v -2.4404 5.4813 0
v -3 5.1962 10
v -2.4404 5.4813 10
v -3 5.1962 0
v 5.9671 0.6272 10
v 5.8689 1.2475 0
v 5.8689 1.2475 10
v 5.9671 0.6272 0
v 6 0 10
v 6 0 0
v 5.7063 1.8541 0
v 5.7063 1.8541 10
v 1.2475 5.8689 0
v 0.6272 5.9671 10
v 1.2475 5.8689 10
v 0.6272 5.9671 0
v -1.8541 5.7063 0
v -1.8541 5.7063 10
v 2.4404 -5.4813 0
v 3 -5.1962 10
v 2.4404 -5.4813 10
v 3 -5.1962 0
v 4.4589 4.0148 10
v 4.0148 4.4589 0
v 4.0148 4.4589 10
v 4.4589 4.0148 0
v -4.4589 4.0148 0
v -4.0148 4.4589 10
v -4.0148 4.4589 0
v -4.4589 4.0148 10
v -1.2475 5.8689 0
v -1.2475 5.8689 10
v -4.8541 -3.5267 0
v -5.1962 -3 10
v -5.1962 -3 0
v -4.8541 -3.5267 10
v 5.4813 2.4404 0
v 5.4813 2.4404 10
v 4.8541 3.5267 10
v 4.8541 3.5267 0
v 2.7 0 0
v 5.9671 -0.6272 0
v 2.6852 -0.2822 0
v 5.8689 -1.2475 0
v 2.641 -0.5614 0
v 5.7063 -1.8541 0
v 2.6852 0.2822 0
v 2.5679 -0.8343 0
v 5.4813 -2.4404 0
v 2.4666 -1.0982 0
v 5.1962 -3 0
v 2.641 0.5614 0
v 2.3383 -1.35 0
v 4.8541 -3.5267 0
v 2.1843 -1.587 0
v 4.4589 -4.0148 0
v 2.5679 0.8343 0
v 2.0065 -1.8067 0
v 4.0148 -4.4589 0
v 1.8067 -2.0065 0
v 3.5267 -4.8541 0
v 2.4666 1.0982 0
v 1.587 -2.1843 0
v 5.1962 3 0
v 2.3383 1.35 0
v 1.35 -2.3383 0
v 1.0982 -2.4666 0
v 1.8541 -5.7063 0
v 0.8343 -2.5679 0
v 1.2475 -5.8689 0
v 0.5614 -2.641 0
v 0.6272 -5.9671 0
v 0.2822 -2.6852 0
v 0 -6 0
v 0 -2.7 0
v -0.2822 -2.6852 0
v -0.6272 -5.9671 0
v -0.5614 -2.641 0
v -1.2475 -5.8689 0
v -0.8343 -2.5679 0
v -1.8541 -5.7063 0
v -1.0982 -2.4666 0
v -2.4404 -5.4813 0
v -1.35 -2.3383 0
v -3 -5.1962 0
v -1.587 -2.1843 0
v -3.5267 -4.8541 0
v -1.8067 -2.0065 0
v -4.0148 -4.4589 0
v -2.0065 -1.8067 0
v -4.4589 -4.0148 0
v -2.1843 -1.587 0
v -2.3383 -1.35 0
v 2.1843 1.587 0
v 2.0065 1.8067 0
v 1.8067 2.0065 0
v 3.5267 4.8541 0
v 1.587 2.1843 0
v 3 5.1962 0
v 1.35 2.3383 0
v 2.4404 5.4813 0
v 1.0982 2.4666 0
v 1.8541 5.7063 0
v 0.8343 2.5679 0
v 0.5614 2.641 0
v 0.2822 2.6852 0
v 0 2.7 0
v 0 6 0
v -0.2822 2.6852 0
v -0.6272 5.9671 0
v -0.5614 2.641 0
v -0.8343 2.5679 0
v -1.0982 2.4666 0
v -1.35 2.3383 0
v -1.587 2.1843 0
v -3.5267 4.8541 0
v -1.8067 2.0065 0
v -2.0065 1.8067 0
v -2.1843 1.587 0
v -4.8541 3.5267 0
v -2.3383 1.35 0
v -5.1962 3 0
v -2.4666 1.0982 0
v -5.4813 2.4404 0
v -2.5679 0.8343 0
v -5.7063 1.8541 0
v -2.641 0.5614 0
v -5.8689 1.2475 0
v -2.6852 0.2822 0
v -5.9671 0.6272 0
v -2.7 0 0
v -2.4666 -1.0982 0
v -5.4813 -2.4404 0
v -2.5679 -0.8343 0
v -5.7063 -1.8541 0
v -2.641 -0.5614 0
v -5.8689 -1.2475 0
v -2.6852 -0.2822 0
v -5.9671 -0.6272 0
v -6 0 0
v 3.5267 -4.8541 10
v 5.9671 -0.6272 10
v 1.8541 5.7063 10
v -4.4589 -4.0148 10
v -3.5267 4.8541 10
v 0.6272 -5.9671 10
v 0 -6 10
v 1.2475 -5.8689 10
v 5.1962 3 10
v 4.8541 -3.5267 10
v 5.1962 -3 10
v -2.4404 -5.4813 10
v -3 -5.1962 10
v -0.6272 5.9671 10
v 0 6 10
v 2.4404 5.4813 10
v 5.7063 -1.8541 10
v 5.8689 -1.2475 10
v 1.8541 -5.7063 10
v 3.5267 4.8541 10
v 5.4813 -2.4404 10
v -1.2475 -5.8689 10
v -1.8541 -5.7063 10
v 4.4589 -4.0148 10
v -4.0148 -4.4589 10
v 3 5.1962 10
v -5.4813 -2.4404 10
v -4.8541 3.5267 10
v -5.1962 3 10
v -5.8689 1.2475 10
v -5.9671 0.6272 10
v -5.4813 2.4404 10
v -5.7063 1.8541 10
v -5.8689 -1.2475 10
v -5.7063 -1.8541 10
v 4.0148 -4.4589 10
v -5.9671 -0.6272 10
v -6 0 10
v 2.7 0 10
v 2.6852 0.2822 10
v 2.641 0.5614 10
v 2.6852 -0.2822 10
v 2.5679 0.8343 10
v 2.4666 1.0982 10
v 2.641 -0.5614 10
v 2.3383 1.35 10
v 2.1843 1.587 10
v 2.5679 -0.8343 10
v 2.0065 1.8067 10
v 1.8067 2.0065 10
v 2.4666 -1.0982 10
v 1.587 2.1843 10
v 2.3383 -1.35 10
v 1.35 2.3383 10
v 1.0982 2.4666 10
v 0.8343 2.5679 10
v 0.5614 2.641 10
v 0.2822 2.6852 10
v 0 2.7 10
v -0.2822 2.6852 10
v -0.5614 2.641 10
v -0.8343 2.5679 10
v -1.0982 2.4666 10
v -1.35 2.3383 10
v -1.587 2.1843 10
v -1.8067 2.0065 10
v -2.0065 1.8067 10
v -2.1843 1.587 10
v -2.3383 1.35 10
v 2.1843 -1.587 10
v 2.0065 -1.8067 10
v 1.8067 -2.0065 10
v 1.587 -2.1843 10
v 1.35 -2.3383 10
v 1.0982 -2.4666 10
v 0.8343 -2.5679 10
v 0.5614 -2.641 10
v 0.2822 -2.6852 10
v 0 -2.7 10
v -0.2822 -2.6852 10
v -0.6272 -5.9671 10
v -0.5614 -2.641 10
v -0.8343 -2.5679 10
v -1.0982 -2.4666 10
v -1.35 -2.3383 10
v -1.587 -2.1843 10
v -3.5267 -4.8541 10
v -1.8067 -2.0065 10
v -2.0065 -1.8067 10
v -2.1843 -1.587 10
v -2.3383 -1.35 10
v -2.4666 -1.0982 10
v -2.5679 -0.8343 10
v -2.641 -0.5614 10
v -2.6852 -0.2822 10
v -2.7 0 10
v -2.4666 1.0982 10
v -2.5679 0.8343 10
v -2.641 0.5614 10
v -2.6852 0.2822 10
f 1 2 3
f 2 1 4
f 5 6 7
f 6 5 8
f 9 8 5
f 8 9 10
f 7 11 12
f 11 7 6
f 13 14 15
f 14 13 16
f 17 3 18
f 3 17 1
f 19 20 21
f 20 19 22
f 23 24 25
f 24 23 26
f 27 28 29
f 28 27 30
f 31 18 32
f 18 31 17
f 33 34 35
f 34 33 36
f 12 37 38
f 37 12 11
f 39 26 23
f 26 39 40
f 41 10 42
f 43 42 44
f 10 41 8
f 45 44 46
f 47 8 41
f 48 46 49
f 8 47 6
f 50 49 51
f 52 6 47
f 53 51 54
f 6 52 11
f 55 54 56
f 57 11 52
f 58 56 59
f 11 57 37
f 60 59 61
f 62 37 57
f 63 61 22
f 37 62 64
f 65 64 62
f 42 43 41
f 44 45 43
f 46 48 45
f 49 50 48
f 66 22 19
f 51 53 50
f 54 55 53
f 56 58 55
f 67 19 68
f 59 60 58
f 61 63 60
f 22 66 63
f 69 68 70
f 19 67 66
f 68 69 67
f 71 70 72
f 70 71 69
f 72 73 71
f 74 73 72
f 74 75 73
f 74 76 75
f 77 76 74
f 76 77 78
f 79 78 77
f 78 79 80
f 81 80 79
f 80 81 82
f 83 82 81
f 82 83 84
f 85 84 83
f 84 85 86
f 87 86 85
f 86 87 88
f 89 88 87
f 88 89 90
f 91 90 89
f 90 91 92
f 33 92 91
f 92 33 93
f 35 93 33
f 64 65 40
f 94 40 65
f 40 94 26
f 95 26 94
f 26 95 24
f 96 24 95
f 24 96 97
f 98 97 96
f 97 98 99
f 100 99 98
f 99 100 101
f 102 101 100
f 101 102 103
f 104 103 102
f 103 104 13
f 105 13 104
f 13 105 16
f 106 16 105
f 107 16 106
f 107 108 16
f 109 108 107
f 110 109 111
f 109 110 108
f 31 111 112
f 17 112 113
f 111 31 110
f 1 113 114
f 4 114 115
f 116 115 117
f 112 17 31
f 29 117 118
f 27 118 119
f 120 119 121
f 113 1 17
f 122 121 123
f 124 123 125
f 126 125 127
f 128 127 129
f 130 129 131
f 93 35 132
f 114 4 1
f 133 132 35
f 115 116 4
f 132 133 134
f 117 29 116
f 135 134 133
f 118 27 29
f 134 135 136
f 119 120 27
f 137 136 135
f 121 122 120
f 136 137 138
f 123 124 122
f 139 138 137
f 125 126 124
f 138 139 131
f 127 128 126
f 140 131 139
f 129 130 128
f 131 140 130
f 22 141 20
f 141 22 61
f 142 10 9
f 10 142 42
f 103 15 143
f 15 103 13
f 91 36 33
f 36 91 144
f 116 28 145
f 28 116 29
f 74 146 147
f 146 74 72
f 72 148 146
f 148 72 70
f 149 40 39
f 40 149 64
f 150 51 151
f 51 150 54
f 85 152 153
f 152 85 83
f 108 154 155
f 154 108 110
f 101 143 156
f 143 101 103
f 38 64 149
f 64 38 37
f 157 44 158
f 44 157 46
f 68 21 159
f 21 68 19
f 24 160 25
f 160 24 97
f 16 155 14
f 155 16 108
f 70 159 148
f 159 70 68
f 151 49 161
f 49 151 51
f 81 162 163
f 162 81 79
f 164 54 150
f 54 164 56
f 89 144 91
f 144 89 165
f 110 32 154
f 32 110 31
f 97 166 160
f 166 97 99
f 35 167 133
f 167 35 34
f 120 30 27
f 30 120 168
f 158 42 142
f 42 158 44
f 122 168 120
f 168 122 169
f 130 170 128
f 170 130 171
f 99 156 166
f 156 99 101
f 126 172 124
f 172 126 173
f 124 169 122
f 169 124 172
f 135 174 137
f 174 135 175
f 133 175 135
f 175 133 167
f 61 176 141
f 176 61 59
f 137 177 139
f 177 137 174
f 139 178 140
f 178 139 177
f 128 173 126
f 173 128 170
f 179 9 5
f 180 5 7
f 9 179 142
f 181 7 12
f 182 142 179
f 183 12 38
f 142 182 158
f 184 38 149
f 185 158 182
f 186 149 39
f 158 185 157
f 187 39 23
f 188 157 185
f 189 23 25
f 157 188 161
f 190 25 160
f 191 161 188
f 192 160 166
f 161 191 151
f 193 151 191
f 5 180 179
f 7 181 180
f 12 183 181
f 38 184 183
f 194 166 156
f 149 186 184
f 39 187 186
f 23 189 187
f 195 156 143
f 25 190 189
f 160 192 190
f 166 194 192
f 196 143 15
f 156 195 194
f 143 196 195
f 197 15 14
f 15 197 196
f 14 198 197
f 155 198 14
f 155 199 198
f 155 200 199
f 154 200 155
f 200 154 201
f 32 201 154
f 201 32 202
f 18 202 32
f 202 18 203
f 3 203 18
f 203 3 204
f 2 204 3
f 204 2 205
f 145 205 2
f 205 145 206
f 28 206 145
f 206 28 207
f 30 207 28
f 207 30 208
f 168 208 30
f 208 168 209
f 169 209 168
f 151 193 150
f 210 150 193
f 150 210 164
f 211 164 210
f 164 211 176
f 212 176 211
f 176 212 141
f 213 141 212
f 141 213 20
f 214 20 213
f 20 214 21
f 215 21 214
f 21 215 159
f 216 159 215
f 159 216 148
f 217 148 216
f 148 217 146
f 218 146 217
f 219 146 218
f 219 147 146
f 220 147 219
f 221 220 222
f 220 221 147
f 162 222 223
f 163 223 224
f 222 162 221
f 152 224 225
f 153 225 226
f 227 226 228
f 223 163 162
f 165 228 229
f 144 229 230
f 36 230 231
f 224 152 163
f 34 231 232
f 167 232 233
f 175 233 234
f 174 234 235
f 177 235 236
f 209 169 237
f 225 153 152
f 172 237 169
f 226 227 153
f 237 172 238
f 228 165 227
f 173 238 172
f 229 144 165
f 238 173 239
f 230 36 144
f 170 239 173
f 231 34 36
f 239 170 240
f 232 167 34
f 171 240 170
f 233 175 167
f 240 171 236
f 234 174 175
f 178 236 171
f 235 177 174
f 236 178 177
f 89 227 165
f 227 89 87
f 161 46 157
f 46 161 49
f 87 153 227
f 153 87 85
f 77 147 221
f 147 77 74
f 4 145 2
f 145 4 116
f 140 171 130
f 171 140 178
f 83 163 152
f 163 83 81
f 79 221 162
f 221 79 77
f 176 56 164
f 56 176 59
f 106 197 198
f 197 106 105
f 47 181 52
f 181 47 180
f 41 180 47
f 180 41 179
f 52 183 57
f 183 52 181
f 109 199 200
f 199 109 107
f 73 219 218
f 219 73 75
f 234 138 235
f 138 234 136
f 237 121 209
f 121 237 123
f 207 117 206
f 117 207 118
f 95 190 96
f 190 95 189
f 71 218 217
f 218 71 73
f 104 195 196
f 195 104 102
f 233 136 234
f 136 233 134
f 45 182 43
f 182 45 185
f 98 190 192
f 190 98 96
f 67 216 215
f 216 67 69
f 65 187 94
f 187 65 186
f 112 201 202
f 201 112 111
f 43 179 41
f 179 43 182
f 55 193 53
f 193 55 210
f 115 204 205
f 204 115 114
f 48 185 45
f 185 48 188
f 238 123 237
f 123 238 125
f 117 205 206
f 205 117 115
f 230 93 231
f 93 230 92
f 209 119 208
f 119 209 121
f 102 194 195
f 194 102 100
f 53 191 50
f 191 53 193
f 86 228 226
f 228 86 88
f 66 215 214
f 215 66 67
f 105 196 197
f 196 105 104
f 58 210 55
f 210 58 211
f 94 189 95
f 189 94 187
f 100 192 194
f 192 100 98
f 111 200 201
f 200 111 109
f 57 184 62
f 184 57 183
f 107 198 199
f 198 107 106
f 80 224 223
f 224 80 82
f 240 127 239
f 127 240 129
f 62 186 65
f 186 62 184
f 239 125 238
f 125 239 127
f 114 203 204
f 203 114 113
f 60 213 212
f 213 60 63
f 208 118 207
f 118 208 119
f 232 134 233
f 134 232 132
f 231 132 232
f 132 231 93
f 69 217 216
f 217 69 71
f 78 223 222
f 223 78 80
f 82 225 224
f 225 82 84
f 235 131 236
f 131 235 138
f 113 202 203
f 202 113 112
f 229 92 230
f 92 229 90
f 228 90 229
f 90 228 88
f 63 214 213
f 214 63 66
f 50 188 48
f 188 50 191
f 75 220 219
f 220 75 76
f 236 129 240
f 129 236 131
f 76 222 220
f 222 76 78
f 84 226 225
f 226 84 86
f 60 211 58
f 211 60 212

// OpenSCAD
// Round spacer.
$fn = 60;
eps = 0.02;
inner_d = 5.4;
outer_d = 12;
length = 10;
difference() { cylinder(d=outer_d,h=length); translate([0,0,-eps]) cylinder(d=inner_d,h=length+2*eps); }
